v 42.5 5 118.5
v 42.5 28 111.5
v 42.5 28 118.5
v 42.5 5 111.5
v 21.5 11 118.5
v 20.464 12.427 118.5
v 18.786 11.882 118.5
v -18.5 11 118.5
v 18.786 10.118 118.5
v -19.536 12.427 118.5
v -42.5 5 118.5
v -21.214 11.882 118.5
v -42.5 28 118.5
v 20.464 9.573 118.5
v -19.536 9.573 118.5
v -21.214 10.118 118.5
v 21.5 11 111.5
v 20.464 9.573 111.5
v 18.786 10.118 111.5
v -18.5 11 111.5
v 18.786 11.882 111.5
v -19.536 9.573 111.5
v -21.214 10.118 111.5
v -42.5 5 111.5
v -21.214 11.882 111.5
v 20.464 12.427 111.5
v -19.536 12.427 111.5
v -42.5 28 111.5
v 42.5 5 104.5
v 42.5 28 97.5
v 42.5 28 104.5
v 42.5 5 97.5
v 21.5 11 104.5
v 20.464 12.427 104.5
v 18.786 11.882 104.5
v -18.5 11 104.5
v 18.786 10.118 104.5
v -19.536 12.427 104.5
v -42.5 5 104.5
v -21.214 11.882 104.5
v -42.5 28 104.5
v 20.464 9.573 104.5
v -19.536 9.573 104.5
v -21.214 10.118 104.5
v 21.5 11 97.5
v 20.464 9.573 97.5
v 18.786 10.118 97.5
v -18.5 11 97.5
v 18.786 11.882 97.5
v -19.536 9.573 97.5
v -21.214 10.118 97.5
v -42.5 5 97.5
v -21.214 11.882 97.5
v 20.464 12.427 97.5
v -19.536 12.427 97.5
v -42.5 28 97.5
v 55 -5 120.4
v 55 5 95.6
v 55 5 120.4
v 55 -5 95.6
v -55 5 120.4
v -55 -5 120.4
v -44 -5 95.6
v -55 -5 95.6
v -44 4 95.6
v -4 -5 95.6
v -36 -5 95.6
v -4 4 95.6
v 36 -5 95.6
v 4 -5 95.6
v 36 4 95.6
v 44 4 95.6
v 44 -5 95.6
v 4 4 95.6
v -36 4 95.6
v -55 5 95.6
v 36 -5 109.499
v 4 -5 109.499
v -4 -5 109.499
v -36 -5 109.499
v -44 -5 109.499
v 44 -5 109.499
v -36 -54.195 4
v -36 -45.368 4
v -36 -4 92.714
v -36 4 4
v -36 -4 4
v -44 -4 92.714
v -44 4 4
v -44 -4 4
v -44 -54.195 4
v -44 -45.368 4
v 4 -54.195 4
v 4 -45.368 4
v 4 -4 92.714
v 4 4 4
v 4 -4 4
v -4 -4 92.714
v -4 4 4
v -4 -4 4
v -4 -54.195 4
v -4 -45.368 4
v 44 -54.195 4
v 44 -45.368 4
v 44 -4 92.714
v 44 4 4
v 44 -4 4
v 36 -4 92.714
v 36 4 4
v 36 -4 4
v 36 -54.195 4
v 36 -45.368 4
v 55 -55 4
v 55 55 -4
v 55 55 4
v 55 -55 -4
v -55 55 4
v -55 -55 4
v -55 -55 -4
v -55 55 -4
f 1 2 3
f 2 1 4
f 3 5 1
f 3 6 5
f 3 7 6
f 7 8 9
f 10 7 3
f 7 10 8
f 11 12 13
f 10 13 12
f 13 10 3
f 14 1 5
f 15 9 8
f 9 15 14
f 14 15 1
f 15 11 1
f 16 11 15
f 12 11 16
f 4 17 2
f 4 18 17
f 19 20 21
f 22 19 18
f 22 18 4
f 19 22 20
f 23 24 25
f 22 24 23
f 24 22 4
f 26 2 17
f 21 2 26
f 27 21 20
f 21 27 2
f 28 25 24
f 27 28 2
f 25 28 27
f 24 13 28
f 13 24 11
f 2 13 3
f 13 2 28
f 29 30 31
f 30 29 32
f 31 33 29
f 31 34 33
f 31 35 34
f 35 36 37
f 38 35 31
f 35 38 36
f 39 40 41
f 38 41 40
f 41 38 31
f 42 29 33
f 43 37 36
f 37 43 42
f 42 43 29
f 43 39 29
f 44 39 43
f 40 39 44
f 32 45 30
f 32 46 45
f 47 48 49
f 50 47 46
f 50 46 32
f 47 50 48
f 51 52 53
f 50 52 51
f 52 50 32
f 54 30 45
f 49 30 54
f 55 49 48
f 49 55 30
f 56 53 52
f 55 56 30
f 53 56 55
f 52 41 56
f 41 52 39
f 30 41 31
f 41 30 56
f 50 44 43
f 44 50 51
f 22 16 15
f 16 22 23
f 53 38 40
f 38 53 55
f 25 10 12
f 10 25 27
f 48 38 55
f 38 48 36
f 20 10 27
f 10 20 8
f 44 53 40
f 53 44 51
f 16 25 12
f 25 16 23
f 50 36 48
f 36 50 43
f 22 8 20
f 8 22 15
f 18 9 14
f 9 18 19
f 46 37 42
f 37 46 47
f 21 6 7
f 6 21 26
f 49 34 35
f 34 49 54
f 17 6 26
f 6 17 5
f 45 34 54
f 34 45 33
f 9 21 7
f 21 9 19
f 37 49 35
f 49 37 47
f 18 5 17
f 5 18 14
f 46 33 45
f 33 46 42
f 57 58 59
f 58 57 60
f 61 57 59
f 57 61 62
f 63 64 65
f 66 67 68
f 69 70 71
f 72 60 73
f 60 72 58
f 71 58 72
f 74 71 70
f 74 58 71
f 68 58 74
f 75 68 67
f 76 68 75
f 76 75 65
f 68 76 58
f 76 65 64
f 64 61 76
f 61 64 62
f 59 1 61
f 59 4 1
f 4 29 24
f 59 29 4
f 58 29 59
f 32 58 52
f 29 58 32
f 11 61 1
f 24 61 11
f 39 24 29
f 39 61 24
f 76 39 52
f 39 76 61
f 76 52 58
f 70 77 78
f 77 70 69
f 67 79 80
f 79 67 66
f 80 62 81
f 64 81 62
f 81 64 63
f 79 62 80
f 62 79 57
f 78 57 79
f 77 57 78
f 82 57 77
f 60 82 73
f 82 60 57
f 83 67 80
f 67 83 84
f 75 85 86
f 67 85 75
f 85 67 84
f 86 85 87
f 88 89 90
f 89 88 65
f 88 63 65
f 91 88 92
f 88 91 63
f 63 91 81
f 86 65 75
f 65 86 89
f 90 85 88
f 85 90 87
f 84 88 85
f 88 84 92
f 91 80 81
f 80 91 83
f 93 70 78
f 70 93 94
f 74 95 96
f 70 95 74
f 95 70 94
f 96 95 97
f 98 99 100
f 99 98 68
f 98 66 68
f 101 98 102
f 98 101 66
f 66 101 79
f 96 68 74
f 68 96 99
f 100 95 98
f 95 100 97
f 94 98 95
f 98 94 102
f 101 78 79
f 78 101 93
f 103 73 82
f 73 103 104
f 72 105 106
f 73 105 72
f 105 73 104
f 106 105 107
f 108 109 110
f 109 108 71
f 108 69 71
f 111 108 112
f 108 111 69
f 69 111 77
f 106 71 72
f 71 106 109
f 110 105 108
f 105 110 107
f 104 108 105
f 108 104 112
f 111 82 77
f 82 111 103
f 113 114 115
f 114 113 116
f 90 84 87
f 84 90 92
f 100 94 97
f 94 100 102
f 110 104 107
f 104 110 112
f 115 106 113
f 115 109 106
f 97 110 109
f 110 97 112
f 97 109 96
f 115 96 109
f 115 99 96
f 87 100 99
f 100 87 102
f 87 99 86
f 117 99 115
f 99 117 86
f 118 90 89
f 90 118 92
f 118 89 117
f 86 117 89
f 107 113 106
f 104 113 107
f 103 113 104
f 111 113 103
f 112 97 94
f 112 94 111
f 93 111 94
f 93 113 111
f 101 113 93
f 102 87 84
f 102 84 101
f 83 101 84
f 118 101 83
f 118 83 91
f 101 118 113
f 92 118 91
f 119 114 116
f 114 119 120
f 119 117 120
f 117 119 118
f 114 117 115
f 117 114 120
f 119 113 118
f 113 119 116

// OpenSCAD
// file: ../robot_settings.scad
main_box_x = 95; // 96
main_box_y = 102;
main_box_z = 74; // 74.5
wall_thickness = 2;

rail_gap = 2;
rail_inset = 7;

rail_thickness = 7;
rail_length = 250;
rail_width = 200;

raspberry_pi_screw_seperation_y = 57;
raspberry_pi_screw_seperation_z = 48;
raspberry_pi_peg_h = 5;

battery_box_peg_h = 6;
battery_box_peg_d = 8;
battery_box_peg_cutout = 5;

gears_module = 1;
pinion_gear_teeth = 32;
pinion_gear_width = 5;
pinion_gear_bore = 8;

gears_setback_distance = 25;
gear_post_height = 2 * pinion_gear_width + rail_thickness + 8 ;

steering_motor_mount_x = 45;
steering_motor_mount_y = 36;
steering_motor_mount_z = 18;
steering_motor_mount_setback_distance = gears_setback_distance + 16;

dc_motor_drivertype = "Teyleten"; // Teyleten
isAdafruit = (dc_motor_drivertype == "Adafruit");

drv8871_x = isAdafruit ? 20.3 : 21.6;
drv8871_y = isAdafruit ?  24 : 25;

drv8871_z = 2;
drv8871_screw_d = 2.5;
drv8871_solder_points_z = 2;

drv8871mount_edge_x = 1.5;
drv8871mount_edge_wall = 3;
drv8871mount_z = 5;
drv8871mount_x = drv8871_x +  drv8871mount_edge_wall - 2* drv8871mount_edge_x;
drv8871mount_y = 19;

drv8871_screw_distance = 15.64;
drv8871_solder_points_d = 1.66;
drv8871_solder_offset_y = 4.4;
drv8871_solder_inner_points_distance = 5;
drv8871_solder_outer_points_distance = 12;

dc_motor_housing_minus_encoder_z = 48;
dc_motor_encoder_z = 9.33;
dc_motor_encoder_wheel_d = 13.4;
dc_motor_encoder_wheel_thickness = 5;
dc_motor_encoder_wheel_gap = 3;
dc_motor_encoder_circuit_thickness = 2;
dc_motor_cutout_d = 24.8;
dc_motor_cutout_z = 19.5;

dc_motor_screw_head_z = 2;
dc_motor_screw_head_d = 5.6;
dc_motor_screw_d = 3.2;
dc_motor_screw_offset = 8.5;

dc_motor_axle_ring_z = 3;
dc_motor_axle_ring_d = 7.2;
dc_motor_axle_cutout_d = 4.5;
dc_motor_axle_cutout_z = 10;
dc_motor_axle_notch_cutout = 0.4;
dc_motor_axle_notch_cutout_z = 6;

pdmount_x = 20;
pdmount_y = 30;
pdmount_z = 2;
pdmount_edge_x = 1.5;
pdmount_edge_wall = 3;

steering_shaft_z = 45;
steering_shaft_d = 7;
steering_shaft_motor_fitting_d = 9;
coupler_length = 24.6;
coupler_diameter = 14;
coupler_screw_d = 4;
coupler_screw_z_offset = 5;
coupler_gear_side_insert = 12.6;
steering_shaft_with_coupler_z = steering_shaft_z - coupler_gear_side_insert;

lidar_mount_y = 110;
lidar_mount_x = 65 + 20;
lidar_narrow_screws = 40;
lidar_wide_screws = 56;
lidar_front_to_back_screws = 70;
lidar_screw_d = 3;
lidar_circuitboard_x = 20;
lidar_circuitboard_y = 35;
lidar_circuitboard_z = 1.2;
lidar_cord_length = 29;

ball_bearing_height = 7;
ball_bearing_outer_diameter = 22;
ball_bearing_inner_diameter = 8;

 armature_holder_height = 20;
 armature_holder_thickness = 8;
pull_bar_peg_r = 3.2;
apparatus_locking_peg_d = 4;

rack_module = 1;
rack_length = main_box_x / 2;
rack_height = 10;
rack_width = 10;
rack_teeth = 30;
rack_bore = 3;

pull_bar_length = rail_width / 2 - rack_length + 1;

// tire hardware
axle_length = 30;
axle_reciever_inner_diameter = 7.75;
axle_reciever_length = 18.8;
axle_notch_length = 7;
axle_notch_cutout = 2.4;

// power distribution bar
power_bar_cutout_x = 96;
power_bar_y = 19.1;
power_bar_z = 1.5;
power_bar_screw_distance = 91.4;
power_bar_screw_d = 2.8;
power_bar_standoff_z = 5;
power_bar_standoff_d = 6.83;

// breadboard
breadboard_wall_thickness = 3;
breadboard_width = 55;
breadboard_length = 83;
breadboard_height = 10.5;
breadboard_notch_width = 4.2;
breadboard_longside_notch_separation = 58.2 - breadboard_notch_width / 2;
breadboard_shortside_notch_separation = 26.3 - breadboard_notch_width;

pico_expander_width = 63;
pico_expander_height = 57;
pico_screw_hole_offset = 3;
pico_screw_hole_d = 2.5;

usbhub_thickness = 11.7;
usbhub_depth = 37.5;
usbhub_width = 86.7;
usbhub_end_port_width = 14.8;
usbhub_end_port_height = 12;
usbhub_front_face_safe_zone_left = 15;
usbhub_front_face_safe_zone_right = 14.8;

switch_w = 16;
switch_cutout_d = 12.2;
switch_bump_h = 2;
switch_bump_l = 18.2;
// main file
   include <../robot_settings.scad>
   
   // front end jack
  module front_end_jack()
  {
    // top bar
    translate([0, 0, 108])
    cube([110, 10, dc_motor_cutout_d], center = true);
    
     // left post
    translate([-40, 0, 54])
    cube([8,8,108], center = true);
    
    // left back support
    translate([-40,  -26, 55])
    rotate([-25, 0, 0])
    cube([8, 8, 120], center = true);
    
    // center post
    translate([0, 0, 108/2])
    cube([8,8, 108], center = true);
   
    // center back support 
    translate([0,  -26, 55])
    rotate([-25, 0, 0])
    cube([8, 8, 120], center = true);
    
    // center post
    translate([40, 0, 108/2])
    cube([8,8, 108], center = true);
   
    // center back support 
    translate([40,  -26, 55])
    rotate([-25, 0, 0])
    cube([8, 8, 120], center = true);
   
   // clam 
   translate([0, 16, 108])
   difference() {
        union() {
        translate([0,  0, rail_thickness])
        cube([lidar_mount_x,  24, rail_thickness], center = true);
        
        translate([0,  0, -rail_thickness])
        cube([lidar_mount_x,  24, rail_thickness], center = true);
        }
         
        // right attachment cutouts for extension
        translate([-20, -5, 0])
        cylinder(h = 40, d = 3, center = true);
        
         // left attachment cutouts for extension
        translate([20, -5, 0])
        cylinder(h = 40, d = 3, center = true);
  }


    // platform
    translate([0,  0, 0])
      cube([110, 110, 8], center = true);
}
front_end_jack();
